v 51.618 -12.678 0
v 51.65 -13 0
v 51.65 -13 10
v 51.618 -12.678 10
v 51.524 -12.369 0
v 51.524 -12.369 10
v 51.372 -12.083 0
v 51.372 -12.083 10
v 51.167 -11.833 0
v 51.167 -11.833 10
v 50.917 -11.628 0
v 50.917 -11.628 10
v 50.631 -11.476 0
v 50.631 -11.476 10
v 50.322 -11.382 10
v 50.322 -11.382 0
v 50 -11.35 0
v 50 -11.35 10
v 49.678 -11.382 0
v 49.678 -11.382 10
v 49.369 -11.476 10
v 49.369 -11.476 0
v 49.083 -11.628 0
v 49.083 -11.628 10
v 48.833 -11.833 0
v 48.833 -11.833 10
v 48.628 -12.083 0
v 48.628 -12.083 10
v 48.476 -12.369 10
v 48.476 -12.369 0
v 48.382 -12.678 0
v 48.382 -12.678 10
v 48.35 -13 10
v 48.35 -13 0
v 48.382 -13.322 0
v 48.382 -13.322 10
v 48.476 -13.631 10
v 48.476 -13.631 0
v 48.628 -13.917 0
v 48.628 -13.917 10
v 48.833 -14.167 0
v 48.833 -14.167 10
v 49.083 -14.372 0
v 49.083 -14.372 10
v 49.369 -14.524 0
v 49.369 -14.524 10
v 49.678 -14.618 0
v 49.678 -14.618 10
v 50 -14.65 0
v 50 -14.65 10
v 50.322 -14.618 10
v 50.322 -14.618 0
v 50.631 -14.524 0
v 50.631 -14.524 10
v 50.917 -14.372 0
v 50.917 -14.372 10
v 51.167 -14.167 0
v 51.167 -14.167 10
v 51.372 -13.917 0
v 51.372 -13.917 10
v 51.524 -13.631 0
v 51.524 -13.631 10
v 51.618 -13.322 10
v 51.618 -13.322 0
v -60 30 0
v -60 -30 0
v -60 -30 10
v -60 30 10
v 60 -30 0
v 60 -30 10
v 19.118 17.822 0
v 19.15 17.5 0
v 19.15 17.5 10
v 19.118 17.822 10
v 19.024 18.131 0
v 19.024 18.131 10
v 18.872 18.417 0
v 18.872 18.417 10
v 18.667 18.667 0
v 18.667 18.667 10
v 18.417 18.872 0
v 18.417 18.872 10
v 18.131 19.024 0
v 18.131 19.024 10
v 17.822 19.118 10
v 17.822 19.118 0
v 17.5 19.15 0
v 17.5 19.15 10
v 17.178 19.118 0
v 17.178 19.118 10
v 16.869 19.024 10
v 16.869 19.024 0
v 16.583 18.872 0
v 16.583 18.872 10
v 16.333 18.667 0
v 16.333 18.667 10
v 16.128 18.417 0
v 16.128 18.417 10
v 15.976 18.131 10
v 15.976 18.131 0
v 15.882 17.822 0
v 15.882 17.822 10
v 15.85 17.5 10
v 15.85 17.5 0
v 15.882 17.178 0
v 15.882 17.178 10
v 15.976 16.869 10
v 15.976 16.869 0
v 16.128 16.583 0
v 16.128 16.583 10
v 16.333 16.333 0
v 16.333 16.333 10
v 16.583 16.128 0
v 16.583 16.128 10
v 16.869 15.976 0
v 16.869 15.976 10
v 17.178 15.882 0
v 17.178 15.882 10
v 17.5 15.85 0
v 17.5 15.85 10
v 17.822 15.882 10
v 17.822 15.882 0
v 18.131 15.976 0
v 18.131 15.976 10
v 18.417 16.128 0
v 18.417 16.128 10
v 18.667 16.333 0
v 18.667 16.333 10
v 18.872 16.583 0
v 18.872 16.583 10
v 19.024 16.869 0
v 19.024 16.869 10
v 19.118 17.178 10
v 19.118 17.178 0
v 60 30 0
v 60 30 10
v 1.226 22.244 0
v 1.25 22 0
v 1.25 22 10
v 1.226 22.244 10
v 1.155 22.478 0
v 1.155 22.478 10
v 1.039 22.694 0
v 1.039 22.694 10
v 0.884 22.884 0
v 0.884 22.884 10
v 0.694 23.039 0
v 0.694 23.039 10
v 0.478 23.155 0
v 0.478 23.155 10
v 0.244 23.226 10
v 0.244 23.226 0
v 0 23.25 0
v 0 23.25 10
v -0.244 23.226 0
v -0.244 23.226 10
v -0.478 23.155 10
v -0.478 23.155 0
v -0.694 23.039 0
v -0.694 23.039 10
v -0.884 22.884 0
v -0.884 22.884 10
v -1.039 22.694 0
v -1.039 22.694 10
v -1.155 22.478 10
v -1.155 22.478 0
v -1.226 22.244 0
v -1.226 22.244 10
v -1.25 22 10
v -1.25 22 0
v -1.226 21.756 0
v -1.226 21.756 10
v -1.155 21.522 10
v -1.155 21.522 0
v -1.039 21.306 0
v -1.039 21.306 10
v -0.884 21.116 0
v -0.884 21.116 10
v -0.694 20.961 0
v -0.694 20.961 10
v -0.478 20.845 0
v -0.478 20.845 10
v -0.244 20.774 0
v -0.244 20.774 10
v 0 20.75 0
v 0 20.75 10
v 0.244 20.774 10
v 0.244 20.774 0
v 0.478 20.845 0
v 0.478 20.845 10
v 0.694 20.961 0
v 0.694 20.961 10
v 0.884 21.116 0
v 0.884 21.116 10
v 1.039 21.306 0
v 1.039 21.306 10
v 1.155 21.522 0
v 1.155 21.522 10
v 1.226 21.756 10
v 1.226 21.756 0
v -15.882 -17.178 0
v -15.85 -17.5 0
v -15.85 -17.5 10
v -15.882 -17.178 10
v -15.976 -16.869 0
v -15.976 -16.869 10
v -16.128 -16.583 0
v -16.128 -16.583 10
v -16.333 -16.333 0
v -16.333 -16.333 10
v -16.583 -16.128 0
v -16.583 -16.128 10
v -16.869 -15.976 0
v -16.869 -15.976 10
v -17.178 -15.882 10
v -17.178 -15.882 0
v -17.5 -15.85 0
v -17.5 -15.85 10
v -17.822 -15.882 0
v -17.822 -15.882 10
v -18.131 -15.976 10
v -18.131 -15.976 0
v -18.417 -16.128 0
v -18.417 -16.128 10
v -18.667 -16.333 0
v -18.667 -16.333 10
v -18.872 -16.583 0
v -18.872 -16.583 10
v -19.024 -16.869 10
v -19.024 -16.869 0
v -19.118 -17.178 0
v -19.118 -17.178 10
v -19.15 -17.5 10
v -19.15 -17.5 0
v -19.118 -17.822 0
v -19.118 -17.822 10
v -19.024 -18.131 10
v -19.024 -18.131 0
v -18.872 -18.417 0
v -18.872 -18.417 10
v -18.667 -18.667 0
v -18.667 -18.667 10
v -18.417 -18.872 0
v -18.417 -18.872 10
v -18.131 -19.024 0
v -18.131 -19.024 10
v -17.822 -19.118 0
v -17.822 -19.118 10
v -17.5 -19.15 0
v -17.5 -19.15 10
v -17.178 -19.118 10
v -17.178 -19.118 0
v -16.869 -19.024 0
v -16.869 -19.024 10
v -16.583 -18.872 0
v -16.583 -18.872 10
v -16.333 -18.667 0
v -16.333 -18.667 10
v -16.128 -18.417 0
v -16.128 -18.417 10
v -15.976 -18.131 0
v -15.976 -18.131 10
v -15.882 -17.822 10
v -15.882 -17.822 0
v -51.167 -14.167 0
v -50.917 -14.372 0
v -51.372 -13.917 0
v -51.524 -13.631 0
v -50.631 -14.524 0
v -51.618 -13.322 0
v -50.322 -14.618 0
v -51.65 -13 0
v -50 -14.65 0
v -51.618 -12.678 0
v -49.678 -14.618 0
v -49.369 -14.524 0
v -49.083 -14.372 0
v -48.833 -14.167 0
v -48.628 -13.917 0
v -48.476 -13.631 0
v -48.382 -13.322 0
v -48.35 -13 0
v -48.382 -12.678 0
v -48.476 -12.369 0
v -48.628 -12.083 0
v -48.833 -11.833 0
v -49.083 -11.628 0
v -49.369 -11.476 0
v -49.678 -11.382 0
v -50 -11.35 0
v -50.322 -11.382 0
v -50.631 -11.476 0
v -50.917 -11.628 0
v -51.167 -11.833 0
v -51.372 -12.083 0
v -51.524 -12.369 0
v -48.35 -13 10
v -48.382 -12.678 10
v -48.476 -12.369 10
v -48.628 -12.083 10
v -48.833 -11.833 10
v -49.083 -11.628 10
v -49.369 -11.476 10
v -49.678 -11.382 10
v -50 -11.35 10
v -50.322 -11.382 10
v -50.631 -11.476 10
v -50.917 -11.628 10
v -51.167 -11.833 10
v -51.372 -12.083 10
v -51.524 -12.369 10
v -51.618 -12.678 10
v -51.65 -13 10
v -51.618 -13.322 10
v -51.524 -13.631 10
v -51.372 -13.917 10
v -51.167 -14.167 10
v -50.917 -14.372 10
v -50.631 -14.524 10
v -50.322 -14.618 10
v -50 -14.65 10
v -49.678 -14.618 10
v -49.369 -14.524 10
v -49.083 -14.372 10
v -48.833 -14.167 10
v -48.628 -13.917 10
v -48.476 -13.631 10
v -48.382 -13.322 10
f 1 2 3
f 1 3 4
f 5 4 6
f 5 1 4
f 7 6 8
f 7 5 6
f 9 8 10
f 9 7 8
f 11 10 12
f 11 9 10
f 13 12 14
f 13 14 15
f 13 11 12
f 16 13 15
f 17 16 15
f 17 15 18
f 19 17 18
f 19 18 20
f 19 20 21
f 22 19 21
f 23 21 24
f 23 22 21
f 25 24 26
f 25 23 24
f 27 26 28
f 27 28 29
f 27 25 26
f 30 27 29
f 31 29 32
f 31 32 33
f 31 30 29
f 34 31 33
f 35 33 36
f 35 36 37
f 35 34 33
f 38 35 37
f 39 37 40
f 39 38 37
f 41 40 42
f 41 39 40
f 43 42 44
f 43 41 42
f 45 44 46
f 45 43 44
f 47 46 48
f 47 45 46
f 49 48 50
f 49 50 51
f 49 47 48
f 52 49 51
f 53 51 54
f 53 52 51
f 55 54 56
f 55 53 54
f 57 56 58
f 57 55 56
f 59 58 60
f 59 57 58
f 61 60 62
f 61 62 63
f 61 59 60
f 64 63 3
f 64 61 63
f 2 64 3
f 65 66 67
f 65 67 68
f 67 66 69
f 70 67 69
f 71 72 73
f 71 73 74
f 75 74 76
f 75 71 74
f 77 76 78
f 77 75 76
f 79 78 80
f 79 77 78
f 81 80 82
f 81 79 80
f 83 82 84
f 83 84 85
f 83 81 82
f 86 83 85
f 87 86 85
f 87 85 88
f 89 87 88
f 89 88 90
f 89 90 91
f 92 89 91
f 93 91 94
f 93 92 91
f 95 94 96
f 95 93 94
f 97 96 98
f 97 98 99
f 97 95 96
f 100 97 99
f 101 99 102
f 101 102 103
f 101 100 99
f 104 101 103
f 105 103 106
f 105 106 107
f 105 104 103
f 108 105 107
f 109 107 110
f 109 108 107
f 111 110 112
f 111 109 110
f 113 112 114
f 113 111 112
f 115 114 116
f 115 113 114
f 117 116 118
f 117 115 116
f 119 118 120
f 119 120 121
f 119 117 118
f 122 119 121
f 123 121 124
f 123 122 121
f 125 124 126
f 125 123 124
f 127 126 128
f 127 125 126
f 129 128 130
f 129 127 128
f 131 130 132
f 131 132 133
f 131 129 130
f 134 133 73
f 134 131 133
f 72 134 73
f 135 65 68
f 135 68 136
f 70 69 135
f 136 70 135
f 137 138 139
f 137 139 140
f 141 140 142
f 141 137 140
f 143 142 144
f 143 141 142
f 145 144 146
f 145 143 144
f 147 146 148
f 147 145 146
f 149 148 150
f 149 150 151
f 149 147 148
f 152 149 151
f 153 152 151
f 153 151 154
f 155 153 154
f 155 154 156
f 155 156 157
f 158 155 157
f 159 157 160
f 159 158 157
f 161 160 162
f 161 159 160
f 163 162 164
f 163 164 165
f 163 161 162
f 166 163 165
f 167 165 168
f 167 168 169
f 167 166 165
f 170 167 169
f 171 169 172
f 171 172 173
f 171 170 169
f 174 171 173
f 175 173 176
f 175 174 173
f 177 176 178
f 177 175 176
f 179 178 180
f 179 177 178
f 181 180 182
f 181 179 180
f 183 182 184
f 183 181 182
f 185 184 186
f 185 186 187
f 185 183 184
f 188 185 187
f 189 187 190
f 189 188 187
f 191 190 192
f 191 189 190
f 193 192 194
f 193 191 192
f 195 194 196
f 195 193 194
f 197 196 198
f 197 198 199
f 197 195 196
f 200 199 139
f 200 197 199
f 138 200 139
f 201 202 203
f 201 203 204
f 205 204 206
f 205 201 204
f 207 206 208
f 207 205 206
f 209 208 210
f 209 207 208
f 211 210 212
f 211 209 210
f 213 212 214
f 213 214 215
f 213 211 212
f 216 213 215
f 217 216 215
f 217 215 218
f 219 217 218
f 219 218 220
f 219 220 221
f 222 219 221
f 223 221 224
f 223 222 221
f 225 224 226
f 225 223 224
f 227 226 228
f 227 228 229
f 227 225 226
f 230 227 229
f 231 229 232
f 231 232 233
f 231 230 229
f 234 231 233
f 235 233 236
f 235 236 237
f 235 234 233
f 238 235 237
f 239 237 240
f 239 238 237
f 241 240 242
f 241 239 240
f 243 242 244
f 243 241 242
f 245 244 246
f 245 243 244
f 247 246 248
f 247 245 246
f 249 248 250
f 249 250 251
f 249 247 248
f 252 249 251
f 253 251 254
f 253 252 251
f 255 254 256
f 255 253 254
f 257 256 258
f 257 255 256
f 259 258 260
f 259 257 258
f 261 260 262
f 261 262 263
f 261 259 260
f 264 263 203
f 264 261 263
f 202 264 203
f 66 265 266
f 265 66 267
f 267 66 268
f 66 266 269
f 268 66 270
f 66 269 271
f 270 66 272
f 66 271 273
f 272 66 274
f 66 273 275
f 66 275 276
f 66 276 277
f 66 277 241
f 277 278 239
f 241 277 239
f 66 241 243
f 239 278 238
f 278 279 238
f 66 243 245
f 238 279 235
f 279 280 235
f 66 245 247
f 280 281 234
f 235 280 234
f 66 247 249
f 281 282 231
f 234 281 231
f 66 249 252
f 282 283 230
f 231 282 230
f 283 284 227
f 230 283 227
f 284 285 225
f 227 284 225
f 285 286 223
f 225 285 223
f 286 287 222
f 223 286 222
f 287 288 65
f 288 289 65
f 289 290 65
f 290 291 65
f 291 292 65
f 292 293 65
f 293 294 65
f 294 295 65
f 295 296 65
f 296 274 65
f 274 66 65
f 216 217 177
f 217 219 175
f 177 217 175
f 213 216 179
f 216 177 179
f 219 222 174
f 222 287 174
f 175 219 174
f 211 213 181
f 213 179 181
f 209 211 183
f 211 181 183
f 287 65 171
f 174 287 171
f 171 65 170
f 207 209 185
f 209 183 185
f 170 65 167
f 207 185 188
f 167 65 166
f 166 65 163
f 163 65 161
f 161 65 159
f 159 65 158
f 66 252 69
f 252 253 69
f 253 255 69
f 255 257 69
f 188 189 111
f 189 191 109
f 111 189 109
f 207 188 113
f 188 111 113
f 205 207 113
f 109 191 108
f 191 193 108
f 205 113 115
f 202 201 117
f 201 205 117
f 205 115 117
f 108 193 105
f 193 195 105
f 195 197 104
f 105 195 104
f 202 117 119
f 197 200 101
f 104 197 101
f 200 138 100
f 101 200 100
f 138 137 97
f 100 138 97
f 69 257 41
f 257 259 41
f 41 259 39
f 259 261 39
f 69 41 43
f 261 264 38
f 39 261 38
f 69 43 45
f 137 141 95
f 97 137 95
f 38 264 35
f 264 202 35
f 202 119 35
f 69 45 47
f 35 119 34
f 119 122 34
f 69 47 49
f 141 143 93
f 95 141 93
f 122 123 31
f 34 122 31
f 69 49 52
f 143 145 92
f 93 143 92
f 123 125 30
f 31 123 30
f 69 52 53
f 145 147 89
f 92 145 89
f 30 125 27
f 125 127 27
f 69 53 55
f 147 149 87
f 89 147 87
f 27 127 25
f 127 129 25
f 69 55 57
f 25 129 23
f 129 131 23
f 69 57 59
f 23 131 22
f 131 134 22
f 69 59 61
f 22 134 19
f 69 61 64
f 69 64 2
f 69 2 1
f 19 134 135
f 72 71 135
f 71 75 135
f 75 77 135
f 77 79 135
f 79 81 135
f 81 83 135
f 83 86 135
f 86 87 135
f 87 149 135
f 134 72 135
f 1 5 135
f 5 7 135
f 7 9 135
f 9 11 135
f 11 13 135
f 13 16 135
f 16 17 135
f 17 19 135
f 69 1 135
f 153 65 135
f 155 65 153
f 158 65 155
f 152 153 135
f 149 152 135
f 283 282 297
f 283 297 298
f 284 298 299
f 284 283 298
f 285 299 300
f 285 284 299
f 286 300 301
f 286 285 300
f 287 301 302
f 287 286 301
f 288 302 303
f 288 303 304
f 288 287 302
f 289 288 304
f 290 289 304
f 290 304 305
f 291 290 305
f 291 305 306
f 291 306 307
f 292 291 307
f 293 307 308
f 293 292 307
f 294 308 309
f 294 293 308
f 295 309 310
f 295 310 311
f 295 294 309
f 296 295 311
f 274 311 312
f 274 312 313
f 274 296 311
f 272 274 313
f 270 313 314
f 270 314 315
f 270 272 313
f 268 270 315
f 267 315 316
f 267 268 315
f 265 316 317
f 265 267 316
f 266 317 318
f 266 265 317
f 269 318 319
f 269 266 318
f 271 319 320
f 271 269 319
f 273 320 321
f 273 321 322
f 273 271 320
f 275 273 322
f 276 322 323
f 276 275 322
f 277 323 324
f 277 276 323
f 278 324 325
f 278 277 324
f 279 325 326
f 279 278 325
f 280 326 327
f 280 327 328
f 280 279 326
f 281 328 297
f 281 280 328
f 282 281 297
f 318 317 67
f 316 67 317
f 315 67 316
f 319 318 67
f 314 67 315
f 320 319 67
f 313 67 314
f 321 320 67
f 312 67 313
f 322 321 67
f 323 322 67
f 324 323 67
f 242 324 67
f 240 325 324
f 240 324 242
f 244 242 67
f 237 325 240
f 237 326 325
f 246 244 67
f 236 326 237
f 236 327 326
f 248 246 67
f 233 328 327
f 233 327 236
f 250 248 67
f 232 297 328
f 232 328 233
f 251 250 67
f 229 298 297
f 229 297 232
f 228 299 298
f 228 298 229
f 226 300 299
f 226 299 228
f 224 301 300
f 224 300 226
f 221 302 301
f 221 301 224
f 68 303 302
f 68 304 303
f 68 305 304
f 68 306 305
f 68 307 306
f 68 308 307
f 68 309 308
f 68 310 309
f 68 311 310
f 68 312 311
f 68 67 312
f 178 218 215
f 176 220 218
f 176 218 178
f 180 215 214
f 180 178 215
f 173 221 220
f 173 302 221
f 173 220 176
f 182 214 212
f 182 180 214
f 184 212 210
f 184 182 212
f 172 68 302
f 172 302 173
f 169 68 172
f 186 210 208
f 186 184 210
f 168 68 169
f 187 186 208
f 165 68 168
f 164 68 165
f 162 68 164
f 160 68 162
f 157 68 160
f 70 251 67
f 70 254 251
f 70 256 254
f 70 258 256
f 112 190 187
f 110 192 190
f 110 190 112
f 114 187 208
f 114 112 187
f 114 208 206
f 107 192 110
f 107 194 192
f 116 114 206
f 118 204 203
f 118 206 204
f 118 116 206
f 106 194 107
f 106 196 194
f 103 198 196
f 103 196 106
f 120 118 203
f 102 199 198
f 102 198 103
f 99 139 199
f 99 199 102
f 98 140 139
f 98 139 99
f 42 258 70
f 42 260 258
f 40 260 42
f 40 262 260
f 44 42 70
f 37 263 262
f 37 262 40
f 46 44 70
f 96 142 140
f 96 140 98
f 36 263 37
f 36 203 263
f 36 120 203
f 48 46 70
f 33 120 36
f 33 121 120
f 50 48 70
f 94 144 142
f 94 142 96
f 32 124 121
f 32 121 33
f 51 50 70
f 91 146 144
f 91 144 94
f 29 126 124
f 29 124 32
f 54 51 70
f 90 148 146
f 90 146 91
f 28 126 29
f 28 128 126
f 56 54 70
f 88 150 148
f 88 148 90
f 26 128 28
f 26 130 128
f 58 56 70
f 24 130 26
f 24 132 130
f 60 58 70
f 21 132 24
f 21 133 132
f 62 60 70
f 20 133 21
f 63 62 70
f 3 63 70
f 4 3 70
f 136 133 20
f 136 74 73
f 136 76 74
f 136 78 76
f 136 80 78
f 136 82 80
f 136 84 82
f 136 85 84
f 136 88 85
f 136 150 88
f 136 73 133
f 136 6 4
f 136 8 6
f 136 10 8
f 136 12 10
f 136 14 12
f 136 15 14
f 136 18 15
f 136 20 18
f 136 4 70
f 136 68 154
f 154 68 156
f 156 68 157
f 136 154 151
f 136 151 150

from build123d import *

# Parameters (mm, degrees)
F0_W     = 120
F0_H     = 60
F0_R     = 1.65
F0_R_2   = 1.25
F1_DEPTH = 10


with BuildPart() as f1:
    # F0 (on Top) → F1 (new body)
    with BuildSketch(Plane.XY):
        Rectangle(F0_W, F0_H)
        with Locations((-17.5, -17.5)):
            Circle(F0_R, mode=Mode.SUBTRACT)
        with Locations((-50, -13)):
            Circle(F0_R, mode=Mode.SUBTRACT)
        with Locations((50, -13)):
            Circle(F0_R, mode=Mode.SUBTRACT)
        with Locations((0, 22)):
            Circle(F0_R_2, mode=Mode.SUBTRACT)
        with Locations((17.5, 17.5)):
            Circle(F0_R, mode=Mode.SUBTRACT)
    extrude(amount=F1_DEPTH)


solid = f1.part
